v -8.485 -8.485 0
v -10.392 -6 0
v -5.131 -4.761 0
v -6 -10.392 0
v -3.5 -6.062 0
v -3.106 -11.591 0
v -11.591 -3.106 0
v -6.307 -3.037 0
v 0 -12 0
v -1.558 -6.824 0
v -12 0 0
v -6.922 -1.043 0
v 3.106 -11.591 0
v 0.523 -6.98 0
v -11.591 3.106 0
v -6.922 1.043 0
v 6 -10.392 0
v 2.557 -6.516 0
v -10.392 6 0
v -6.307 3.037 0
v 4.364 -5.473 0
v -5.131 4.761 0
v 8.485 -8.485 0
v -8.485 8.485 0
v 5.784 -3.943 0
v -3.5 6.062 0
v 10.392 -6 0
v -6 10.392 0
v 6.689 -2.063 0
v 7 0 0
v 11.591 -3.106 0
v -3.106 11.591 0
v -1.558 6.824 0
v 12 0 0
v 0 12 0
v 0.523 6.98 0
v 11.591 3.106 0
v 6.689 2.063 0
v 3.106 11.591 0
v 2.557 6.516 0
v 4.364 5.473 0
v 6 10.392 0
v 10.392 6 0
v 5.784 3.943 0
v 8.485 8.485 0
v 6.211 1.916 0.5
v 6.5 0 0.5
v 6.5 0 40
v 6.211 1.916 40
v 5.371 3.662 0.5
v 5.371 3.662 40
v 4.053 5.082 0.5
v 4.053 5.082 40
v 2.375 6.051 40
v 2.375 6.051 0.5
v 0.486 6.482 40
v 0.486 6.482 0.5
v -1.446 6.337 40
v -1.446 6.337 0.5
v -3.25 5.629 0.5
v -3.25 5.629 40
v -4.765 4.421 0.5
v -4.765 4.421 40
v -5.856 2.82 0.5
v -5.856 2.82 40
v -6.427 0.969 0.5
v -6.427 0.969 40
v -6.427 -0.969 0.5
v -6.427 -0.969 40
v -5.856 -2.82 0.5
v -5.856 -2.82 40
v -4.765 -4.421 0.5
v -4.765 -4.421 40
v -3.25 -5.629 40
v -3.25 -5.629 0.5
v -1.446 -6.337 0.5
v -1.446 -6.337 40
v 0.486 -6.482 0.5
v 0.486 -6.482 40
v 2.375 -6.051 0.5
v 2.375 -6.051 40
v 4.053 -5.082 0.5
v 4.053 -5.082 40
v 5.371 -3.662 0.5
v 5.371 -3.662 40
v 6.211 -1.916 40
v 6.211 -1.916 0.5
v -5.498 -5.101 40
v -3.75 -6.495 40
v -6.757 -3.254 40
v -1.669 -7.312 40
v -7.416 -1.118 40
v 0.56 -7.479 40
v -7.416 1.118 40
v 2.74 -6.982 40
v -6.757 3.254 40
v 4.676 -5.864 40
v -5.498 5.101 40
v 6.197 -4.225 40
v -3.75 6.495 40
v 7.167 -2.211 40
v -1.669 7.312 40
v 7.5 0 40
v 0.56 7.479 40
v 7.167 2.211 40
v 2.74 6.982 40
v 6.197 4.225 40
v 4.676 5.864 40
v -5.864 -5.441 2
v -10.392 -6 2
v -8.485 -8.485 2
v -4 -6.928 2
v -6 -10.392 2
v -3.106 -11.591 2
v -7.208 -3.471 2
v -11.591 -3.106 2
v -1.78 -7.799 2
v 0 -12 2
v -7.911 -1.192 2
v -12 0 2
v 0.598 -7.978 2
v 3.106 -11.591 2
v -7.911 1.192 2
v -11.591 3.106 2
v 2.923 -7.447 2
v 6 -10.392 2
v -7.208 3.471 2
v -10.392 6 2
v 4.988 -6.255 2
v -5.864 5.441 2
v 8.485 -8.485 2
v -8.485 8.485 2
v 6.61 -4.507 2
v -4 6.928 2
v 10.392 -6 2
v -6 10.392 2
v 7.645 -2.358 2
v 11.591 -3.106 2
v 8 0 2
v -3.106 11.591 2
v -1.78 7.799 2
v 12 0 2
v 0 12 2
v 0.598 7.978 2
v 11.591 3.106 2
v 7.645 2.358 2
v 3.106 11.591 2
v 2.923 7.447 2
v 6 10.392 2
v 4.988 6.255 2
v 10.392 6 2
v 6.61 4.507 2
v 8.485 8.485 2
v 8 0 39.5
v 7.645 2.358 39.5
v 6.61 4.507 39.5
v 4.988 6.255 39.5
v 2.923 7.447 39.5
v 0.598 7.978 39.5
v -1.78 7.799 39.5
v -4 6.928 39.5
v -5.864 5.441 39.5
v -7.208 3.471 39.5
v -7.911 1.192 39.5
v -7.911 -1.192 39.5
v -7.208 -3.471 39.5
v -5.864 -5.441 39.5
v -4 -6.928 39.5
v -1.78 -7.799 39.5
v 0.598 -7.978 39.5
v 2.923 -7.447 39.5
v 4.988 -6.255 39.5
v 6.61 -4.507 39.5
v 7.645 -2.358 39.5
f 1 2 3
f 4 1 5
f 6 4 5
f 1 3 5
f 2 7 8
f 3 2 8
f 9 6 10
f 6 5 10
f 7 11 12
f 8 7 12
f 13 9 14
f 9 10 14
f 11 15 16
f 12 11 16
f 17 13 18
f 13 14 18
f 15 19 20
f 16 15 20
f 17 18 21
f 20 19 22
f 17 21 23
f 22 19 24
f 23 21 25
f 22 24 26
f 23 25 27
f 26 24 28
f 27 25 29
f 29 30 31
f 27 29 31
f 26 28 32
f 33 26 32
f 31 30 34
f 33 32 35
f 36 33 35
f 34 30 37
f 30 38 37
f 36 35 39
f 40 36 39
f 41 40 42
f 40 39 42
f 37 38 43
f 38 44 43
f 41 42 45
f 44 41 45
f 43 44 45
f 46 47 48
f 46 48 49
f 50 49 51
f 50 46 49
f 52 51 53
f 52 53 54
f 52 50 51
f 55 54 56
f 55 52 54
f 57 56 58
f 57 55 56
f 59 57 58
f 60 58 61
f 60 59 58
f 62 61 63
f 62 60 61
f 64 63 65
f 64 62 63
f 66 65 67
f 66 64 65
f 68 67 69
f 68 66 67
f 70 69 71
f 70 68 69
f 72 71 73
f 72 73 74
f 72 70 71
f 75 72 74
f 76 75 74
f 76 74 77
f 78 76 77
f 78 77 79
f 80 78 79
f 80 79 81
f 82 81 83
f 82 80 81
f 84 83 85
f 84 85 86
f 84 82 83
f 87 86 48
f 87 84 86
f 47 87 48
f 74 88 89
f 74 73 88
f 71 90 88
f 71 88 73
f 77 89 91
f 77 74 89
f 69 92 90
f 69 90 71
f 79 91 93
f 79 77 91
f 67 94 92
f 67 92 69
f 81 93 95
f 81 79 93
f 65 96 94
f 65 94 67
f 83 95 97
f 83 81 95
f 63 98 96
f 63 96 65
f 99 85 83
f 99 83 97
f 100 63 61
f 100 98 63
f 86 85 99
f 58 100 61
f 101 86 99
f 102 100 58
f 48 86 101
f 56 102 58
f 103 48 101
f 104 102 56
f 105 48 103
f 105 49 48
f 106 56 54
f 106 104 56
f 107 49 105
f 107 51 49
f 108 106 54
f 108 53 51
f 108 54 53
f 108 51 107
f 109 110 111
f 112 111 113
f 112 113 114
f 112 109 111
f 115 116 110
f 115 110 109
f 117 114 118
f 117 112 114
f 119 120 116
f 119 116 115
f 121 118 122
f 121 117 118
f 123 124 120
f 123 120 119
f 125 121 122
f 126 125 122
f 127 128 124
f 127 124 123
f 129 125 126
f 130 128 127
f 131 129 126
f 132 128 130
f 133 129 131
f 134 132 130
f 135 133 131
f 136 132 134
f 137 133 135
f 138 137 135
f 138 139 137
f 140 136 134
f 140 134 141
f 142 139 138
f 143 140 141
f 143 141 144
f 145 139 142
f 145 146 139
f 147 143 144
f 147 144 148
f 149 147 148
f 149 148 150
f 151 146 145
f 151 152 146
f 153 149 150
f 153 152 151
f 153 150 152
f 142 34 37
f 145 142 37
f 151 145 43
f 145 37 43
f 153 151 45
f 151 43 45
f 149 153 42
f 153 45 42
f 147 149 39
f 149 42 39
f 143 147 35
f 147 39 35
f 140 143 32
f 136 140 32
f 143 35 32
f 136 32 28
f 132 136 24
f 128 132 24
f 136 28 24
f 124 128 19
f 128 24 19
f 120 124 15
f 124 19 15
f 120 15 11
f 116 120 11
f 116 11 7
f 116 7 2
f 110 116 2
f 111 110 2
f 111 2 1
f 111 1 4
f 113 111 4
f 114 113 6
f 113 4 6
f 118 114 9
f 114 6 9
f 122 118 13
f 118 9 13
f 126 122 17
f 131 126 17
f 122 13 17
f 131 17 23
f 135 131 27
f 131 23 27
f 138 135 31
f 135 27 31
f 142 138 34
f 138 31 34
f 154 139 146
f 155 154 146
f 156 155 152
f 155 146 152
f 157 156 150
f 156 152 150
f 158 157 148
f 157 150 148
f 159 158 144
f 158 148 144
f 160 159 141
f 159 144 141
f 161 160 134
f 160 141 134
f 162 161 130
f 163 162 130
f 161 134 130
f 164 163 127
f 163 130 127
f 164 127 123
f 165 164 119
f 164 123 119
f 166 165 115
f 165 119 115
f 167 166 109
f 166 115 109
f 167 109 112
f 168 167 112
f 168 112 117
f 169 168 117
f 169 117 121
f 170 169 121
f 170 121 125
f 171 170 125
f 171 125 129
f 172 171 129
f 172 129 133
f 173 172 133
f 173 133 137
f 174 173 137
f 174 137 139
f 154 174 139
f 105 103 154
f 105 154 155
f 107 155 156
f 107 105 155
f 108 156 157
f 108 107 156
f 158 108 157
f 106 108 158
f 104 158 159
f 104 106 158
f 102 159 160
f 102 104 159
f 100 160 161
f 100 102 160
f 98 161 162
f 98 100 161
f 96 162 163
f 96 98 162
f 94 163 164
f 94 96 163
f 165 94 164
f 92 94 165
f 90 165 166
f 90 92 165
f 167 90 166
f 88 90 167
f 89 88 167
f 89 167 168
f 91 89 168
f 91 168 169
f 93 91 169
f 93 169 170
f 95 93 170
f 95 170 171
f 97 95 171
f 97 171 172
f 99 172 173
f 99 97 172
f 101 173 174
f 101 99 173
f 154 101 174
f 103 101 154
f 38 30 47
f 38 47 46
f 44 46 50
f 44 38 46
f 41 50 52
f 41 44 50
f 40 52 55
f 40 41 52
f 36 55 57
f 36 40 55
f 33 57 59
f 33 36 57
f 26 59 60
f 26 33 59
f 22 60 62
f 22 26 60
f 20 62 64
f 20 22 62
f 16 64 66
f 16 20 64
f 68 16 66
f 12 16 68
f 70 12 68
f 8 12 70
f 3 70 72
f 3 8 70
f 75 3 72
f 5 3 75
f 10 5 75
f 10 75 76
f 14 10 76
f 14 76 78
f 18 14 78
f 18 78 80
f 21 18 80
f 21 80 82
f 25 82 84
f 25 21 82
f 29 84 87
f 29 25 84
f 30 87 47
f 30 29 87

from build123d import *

# Parameters (mm, degrees)
SKETCH_R        = 8
SKETCH_R_2      = 6.5
PAD_DEPTH       = 40
SKETCH001_R     = 12
SKETCH001_R_2   = 6.5
PAD001_DEPTH    = 2
CHAMFER_SIZE    = 0.5
CHAMFER001_SIZE = 0.5


with BuildPart() as part:
    # Sketch → Pad (new body)
    with BuildSketch(Plane.XY):
        Circle(SKETCH_R)
        Circle(SKETCH_R_2, mode=Mode.SUBTRACT)
    extrude(amount=PAD_DEPTH)

    # Sketch001 → Pad001 (join)
    with BuildSketch(Plane.XY):
        Circle(SKETCH001_R)
        Circle(SKETCH001_R_2, mode=Mode.SUBTRACT)
    extrude(amount=PAD001_DEPTH)

    # Chamfer
    chamfer_edges = [part.edges().sort_by_distance(p)[0] for p in [
        (-8, 0, 40),
    ]]
    chamfer(chamfer_edges, length=CHAMFER_SIZE)

    # Chamfer001
    chamfer001_edges = [part.edges().sort_by_distance(p)[0] for p in [
        (-6.5, 0, 0),
    ]]
    chamfer(chamfer001_edges, length=CHAMFER001_SIZE)


solid = part.part
